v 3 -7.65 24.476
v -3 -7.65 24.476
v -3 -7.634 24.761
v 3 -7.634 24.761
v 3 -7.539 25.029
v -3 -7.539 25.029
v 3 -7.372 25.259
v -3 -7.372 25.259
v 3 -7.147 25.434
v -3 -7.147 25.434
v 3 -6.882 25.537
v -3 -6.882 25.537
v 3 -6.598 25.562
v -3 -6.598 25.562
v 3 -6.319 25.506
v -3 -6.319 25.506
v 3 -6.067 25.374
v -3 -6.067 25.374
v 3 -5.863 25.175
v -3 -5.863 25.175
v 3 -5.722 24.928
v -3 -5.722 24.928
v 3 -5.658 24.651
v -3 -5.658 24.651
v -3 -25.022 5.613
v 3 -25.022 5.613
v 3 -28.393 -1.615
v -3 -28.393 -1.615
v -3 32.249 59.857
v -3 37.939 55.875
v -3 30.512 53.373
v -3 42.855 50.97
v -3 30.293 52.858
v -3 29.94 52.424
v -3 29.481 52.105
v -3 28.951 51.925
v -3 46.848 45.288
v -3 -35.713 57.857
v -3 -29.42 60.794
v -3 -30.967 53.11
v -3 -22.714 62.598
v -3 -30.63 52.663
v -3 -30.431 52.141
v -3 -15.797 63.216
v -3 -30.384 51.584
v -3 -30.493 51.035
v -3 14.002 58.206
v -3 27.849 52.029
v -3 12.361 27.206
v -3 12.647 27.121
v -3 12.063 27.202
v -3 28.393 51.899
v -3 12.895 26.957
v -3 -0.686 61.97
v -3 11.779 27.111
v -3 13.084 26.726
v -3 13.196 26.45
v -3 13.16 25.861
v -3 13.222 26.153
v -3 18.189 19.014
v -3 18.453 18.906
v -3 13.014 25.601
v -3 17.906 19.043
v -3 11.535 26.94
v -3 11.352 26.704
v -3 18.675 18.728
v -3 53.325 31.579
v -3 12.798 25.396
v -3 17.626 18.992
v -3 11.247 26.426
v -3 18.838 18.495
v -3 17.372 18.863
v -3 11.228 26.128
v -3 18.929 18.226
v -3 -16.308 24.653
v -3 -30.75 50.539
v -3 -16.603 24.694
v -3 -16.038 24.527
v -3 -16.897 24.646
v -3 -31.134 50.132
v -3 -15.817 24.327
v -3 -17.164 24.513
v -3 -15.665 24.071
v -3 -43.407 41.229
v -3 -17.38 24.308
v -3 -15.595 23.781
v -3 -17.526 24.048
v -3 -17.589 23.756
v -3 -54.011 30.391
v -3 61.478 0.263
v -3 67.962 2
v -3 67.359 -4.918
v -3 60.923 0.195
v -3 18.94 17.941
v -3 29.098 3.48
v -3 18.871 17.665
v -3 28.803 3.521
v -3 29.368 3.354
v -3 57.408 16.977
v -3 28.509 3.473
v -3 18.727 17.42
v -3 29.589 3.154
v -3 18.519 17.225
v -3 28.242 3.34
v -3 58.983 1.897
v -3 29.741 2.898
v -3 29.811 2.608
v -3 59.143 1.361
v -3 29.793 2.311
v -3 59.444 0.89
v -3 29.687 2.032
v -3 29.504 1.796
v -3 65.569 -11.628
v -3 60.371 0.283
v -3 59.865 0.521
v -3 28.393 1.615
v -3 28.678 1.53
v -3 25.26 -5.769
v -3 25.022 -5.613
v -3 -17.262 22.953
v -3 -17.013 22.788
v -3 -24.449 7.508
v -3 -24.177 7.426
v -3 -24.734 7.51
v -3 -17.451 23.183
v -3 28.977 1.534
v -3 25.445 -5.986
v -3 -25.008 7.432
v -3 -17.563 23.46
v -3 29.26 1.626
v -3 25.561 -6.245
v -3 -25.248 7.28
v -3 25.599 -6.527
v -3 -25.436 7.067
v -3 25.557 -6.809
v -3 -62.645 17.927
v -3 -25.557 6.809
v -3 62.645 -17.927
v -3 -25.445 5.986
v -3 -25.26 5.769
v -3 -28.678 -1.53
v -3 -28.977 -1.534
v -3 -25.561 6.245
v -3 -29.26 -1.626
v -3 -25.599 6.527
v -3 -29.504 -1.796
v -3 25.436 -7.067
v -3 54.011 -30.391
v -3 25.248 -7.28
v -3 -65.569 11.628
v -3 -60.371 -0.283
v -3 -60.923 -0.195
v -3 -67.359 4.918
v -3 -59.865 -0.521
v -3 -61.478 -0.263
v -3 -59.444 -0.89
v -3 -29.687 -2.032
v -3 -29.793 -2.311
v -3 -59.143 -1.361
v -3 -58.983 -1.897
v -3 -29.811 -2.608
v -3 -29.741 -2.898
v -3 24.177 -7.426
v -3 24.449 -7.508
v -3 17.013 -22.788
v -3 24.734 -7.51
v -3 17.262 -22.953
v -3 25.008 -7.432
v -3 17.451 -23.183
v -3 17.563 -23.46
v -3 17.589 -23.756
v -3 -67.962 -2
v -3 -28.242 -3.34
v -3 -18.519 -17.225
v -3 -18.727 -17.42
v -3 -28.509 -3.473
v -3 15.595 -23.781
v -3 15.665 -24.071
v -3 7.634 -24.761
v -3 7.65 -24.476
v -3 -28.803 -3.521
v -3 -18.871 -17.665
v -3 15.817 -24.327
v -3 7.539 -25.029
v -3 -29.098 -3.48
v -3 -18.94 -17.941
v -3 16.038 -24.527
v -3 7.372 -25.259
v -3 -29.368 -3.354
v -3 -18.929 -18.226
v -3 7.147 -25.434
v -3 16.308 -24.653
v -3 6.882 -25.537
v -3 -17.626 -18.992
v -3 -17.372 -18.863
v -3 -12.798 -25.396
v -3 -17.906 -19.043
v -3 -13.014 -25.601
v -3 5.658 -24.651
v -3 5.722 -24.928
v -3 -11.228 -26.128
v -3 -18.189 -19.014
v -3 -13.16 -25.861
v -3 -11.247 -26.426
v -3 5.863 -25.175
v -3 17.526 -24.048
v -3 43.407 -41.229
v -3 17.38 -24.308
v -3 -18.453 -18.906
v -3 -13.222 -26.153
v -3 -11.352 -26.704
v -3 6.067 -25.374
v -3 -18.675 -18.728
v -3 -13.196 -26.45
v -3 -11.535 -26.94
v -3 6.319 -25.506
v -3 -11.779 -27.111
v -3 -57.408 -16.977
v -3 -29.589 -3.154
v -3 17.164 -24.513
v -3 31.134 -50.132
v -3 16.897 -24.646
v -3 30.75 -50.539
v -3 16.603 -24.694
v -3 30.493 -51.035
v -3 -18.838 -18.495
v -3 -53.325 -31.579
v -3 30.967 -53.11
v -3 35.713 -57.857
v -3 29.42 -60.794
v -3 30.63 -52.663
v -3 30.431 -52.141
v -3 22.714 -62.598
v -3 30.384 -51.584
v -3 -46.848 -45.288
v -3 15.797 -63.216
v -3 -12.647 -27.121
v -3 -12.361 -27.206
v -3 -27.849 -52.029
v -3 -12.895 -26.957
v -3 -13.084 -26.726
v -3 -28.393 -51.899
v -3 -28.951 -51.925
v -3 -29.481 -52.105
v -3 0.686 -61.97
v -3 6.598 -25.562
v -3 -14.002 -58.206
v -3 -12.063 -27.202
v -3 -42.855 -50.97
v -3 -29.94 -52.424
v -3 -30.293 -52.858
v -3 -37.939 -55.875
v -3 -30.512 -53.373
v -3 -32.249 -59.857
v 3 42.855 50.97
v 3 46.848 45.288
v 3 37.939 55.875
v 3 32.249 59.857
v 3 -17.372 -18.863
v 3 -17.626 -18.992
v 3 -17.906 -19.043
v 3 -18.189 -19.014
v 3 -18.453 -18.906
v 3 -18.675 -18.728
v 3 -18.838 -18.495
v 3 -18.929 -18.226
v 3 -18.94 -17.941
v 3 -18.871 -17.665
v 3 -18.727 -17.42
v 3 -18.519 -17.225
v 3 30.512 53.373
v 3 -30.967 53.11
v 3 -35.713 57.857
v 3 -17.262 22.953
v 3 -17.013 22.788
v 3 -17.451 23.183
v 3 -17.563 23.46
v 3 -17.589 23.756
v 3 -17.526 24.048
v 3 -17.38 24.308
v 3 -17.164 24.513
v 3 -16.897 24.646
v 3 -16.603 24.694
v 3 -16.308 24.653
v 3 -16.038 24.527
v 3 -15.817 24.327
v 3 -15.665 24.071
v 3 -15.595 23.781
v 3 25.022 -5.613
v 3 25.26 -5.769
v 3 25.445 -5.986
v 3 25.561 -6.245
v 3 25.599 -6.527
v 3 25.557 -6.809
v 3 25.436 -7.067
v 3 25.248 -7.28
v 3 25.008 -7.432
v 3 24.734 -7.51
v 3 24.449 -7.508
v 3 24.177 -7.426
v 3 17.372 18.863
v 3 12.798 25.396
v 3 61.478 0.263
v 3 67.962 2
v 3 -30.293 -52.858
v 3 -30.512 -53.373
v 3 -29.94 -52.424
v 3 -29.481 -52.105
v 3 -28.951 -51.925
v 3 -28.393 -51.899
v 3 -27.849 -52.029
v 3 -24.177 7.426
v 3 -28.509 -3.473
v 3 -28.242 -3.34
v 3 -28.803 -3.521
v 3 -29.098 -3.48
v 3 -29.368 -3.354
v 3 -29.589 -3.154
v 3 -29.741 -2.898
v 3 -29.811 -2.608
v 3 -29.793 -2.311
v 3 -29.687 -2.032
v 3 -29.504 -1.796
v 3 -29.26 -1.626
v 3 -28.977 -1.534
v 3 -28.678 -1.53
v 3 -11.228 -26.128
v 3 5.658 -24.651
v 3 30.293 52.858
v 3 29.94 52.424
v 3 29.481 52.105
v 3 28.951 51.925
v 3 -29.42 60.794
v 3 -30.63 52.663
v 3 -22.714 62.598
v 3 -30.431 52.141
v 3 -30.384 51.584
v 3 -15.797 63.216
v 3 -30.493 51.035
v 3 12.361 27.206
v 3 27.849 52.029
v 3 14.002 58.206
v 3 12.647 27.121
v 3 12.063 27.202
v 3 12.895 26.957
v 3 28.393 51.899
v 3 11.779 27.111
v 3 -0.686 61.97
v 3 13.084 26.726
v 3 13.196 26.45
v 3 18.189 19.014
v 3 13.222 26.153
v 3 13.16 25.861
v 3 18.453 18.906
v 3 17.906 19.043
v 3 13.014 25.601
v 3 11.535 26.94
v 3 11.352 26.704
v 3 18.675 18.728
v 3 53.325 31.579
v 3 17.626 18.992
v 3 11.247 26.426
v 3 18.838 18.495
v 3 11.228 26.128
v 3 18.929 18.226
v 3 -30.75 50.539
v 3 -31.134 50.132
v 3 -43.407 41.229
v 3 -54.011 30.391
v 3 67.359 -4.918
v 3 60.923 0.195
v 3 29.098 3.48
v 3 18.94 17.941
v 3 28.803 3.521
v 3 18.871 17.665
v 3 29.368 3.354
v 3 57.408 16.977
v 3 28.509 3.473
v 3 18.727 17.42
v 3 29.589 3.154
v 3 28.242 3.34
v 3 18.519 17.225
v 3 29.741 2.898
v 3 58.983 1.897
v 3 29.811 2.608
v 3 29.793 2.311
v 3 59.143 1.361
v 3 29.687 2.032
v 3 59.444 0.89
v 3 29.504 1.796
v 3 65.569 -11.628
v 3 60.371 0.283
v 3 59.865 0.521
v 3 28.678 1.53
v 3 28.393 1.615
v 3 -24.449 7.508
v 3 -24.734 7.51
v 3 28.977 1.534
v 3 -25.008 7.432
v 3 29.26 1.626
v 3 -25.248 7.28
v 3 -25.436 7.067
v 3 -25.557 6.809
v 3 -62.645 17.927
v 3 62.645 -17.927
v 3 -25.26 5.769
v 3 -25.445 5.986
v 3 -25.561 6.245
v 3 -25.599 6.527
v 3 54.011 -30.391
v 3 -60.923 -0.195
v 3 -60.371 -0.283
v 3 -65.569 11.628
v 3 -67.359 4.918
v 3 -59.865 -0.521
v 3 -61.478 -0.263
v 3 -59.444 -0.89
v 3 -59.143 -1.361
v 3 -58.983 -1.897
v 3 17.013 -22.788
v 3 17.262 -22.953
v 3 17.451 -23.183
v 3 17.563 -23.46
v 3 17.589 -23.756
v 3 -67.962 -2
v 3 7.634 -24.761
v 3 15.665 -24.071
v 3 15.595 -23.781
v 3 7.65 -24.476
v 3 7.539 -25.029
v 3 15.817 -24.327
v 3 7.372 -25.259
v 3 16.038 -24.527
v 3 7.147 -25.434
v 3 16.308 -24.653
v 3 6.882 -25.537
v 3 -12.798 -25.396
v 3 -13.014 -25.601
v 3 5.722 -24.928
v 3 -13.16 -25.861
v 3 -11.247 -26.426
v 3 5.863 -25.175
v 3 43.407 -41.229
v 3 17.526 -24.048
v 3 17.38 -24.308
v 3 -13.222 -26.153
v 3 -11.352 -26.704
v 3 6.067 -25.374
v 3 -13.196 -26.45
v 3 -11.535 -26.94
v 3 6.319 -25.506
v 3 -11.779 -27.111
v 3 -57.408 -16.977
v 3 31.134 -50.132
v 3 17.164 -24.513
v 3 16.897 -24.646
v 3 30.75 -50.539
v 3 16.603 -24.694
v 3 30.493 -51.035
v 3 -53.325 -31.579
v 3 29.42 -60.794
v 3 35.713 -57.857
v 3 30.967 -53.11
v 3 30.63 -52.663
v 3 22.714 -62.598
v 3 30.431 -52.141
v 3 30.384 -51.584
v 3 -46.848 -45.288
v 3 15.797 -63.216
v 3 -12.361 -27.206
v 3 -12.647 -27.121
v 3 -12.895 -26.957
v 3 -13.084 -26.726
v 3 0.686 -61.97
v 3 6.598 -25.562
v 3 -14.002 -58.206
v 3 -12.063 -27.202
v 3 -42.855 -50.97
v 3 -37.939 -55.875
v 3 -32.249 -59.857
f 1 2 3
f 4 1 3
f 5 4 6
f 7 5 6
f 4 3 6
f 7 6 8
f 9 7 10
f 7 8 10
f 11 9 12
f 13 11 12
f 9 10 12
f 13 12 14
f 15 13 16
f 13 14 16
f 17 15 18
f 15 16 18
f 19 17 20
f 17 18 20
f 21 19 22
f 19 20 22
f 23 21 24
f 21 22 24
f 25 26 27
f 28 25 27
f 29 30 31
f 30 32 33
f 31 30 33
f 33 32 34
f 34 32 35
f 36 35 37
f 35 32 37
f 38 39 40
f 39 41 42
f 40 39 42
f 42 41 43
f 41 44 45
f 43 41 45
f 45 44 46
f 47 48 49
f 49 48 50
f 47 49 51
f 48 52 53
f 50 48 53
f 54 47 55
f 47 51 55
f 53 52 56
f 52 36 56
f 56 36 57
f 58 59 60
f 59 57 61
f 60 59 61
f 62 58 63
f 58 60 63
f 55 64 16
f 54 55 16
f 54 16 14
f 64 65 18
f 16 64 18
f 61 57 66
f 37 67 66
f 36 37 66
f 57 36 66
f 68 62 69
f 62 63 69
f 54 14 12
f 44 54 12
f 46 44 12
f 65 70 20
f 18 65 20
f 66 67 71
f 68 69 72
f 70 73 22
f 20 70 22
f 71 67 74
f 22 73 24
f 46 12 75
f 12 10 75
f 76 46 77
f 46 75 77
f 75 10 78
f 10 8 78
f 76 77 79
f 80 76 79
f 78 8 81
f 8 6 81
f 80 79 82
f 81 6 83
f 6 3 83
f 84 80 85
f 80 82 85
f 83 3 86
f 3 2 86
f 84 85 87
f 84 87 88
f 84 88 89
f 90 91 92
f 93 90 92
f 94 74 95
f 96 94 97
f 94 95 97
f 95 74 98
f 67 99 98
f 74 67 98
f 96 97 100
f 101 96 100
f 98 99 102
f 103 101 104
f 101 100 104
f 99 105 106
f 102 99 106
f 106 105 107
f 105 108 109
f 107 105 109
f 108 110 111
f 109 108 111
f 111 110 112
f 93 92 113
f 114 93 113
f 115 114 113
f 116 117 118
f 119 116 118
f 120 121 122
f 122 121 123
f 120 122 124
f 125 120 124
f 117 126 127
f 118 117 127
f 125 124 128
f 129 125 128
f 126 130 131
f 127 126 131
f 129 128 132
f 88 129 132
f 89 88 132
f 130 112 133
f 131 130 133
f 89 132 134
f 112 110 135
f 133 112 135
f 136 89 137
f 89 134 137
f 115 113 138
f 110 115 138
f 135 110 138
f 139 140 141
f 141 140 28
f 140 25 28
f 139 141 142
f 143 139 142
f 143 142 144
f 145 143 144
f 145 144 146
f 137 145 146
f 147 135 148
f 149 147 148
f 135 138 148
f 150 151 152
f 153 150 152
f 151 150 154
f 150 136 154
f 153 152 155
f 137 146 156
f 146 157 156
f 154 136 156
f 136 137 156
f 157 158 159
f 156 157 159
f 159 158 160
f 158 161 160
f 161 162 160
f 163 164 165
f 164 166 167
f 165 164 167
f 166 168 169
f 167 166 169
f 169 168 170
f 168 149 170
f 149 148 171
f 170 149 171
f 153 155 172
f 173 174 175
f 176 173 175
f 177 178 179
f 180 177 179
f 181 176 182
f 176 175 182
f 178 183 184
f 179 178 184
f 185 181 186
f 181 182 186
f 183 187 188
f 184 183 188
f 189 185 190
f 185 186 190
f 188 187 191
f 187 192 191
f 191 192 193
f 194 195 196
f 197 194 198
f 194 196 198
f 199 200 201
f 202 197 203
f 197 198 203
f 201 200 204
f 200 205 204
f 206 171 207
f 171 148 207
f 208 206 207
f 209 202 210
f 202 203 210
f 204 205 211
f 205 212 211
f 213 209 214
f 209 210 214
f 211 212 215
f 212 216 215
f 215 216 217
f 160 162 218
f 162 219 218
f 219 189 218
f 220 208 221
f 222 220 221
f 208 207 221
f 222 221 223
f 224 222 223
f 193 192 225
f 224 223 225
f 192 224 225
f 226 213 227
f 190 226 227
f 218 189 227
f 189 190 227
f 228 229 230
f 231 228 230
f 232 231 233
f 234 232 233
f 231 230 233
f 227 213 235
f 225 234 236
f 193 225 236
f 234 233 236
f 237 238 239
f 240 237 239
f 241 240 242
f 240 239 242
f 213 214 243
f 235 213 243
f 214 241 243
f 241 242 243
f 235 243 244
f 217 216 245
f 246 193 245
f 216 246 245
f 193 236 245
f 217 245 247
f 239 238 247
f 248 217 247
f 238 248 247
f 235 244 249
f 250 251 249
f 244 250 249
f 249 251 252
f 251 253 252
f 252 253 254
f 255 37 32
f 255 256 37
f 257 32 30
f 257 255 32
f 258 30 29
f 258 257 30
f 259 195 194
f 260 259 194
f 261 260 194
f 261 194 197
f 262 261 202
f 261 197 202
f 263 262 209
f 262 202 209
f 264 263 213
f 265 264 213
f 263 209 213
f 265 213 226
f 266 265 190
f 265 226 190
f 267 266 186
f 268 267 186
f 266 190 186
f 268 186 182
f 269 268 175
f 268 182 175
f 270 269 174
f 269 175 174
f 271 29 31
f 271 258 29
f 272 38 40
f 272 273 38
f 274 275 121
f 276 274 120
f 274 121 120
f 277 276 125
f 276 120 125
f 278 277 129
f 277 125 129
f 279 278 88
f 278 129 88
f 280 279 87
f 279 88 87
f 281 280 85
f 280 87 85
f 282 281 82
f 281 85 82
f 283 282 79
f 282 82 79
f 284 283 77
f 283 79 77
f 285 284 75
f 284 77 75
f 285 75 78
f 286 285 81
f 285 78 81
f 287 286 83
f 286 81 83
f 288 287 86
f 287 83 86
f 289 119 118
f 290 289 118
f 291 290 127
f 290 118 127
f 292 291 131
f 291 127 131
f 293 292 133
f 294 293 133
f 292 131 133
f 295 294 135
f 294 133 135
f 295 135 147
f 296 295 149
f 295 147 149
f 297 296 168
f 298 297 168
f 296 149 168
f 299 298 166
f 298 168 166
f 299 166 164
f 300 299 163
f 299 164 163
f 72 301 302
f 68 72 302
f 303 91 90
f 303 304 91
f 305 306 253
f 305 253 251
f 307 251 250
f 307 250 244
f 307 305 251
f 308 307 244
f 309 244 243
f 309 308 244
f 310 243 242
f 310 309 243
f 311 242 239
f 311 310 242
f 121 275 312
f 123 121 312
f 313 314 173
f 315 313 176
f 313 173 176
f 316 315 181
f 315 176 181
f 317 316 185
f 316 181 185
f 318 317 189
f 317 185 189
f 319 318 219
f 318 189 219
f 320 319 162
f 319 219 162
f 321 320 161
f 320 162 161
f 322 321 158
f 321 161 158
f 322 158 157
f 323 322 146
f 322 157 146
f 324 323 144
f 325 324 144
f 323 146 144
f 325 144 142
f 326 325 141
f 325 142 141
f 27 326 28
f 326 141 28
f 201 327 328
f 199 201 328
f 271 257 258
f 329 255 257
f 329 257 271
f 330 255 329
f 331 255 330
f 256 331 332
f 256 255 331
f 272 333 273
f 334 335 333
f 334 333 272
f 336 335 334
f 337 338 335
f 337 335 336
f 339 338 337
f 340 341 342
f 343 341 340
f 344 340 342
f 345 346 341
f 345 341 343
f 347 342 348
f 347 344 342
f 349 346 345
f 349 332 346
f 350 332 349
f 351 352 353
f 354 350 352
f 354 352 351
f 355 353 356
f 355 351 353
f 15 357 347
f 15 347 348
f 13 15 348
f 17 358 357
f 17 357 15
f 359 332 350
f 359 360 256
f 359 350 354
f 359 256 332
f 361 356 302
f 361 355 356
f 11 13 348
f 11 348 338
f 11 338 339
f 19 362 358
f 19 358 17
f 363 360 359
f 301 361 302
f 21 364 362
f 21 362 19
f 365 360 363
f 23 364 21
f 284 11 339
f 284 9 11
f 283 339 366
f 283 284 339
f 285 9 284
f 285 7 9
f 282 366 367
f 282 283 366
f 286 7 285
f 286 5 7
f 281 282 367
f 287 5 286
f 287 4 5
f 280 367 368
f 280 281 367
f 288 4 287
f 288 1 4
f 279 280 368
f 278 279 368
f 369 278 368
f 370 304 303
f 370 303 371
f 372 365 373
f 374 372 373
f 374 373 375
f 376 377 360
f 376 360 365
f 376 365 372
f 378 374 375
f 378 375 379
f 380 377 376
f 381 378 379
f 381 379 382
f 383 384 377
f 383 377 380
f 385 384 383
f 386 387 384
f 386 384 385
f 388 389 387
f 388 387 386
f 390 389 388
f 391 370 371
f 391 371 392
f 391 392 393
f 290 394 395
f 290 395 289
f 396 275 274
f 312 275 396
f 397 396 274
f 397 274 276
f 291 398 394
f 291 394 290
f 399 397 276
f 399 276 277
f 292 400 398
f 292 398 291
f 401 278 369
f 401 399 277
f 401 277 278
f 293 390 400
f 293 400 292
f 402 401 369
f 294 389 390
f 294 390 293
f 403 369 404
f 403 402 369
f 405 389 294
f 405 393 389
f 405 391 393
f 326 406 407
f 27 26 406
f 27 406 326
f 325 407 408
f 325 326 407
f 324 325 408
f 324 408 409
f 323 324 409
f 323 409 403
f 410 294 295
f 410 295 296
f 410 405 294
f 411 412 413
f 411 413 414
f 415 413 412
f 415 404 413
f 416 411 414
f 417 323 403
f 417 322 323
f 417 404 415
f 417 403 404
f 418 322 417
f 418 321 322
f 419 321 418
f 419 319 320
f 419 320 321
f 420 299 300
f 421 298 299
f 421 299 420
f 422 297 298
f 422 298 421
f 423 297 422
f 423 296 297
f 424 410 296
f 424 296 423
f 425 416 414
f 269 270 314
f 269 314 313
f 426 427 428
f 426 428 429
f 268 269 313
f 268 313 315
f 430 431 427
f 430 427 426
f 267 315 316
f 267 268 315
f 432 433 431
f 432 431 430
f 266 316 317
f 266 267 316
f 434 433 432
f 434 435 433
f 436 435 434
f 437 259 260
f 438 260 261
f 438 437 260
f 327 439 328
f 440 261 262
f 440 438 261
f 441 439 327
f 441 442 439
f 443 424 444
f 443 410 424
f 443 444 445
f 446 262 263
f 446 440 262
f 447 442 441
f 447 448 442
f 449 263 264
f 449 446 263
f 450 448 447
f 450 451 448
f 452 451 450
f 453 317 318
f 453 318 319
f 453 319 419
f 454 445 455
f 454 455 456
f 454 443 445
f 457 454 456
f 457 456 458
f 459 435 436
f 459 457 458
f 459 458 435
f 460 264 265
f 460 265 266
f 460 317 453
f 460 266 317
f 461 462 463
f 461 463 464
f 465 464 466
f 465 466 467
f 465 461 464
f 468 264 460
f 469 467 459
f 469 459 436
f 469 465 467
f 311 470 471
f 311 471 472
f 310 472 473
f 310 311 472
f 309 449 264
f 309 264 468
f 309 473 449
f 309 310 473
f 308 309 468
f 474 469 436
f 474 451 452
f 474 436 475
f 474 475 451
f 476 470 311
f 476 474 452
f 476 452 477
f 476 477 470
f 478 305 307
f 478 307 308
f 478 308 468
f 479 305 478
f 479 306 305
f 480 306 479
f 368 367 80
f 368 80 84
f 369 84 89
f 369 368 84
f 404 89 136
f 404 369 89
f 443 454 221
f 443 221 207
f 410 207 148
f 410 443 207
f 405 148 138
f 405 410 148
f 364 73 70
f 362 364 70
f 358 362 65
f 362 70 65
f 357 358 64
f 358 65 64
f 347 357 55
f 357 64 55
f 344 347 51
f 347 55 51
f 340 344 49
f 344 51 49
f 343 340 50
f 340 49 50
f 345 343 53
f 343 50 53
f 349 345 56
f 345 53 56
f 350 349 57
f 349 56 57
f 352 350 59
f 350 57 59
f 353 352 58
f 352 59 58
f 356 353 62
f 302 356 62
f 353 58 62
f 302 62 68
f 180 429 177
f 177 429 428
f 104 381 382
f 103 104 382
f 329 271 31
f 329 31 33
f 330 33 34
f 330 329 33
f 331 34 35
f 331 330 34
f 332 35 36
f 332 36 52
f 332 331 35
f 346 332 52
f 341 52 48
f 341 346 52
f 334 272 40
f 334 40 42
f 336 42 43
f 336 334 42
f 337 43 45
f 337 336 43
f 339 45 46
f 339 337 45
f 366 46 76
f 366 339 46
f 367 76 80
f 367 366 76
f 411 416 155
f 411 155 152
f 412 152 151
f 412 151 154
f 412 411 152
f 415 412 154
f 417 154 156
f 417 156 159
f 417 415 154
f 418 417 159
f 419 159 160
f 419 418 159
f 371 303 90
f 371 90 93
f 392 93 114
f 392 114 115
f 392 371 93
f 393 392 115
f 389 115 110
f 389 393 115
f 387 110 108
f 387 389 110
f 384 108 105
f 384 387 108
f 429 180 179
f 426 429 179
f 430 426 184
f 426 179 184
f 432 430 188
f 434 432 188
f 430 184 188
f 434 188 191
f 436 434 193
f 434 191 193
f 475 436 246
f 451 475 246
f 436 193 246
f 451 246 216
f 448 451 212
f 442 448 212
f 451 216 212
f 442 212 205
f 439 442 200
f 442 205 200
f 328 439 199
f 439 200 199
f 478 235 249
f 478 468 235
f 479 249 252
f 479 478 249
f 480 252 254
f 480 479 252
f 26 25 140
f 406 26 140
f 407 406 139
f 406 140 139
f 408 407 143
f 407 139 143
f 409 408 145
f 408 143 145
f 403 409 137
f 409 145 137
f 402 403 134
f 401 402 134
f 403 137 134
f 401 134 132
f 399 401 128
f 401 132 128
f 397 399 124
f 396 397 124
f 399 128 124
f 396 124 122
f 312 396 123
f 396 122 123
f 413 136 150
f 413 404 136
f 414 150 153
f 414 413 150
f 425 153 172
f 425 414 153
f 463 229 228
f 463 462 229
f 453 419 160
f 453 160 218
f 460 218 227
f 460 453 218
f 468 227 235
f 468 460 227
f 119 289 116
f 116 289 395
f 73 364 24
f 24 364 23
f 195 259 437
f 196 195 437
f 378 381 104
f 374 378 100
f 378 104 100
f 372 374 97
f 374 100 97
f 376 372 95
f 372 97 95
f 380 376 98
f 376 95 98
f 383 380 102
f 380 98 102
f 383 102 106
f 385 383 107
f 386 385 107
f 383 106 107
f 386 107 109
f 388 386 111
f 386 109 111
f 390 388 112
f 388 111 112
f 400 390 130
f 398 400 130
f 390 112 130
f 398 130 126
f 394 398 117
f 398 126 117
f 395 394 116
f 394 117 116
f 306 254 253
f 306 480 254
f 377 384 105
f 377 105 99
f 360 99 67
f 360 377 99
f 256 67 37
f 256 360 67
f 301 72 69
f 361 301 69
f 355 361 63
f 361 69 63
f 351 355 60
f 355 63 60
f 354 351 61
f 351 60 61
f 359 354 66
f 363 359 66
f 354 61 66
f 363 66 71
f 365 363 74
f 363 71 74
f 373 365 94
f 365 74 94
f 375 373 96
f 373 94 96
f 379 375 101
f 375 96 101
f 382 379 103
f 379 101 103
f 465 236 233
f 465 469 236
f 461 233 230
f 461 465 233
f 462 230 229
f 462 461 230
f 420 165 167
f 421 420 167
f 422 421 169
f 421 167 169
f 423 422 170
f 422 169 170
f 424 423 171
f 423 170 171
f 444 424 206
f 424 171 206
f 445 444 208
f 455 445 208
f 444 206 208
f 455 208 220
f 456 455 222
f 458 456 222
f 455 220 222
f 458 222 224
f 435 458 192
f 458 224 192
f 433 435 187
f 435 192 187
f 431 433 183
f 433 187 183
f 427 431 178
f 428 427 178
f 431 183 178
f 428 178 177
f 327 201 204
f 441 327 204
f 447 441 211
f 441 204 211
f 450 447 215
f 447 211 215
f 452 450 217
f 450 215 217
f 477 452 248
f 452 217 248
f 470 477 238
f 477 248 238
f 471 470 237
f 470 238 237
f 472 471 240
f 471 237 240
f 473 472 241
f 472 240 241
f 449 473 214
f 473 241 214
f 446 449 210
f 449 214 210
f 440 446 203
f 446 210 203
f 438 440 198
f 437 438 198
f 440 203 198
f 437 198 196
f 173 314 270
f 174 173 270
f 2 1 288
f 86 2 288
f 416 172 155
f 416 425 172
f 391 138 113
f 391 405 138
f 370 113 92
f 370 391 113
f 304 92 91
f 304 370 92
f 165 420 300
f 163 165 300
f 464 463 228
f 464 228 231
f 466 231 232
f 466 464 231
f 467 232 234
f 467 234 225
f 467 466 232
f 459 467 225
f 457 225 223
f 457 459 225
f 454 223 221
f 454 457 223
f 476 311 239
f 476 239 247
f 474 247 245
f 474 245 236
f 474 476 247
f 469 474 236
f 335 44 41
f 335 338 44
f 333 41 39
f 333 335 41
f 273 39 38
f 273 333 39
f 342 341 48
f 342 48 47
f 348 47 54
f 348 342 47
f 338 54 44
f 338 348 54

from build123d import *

# Parameters (mm, degrees)
SKETCH1_R                = 59
EXTRUDE1_DEPTH           = 3
EXTRUDE2_DEPTH           = 3
CIRPATTERN1_COUNT        = 6
F_2_0_2_DIAMETER_HOLE1_D = 2
F_2_0_2_DIAMETER_HOLE3_D = 2
CIRPATTERN2_COUNT        = 6


with BuildPart() as part:
    # Sketch1 → Extrude1 (new, symmetric)
    with BuildSketch(Plane(origin=(0, 0, 0), x_dir=(0, 0, -1), z_dir=(1, 0, 0))):
        Circle(SKETCH1_R)
        Polygon((23.694176429, 16.590840947), (-2.521001516, 28.815179183), (-26.215177945, 12.224338236), (-23.694176429, -16.590840947), (2.521001516, -28.815179183), (26.215177945, -12.224338236), align=None, mode=Mode.SUBTRACT)
    extrude(amount=EXTRUDE1_DEPTH, both=True)

    # Sketch2 → Extrude2 (add, symmetric)
    with BuildSketch(Plane(origin=(0, 0, 0), x_dir=(0, 0, -1), z_dir=(1, 0, 0))):
        with BuildLine():
            Line((-2, 67.961805723), (-0.262709442, 61.478149092))
            ThreePointArc((-0.262709442, 61.478149092), (-0.58620663, 59.77173183), (-2.122608272, 58.961805723))
            ThreePointArc((-2.122608272, 58.961805723), (28.679663449, 51.560419941), (51.21368579, 29.294340542))
            ThreePointArc((51.21368579, 29.294340542), (36.791707484, 48.186627241), (17.927108603, 62.644803614))
            ThreePointArc((17.927108603, 62.644803614), (8.312130826, 66.609702921), (-2, 67.961805723))
        make_face()
    extrude2 = extrude(amount=EXTRUDE2_DEPTH, both=True)

    # CirPattern1: Extrude2 ×6 about axis
    cirpattern1_axis = Axis((0, 0, 0), (1, 0, 0))
    for i in range(1, CIRPATTERN1_COUNT):
        add(extrude2.rotate(cirpattern1_axis, i * 360 / CIRPATTERN1_COUNT))

    # Ø2.0 (2) Diameter Hole1 (through all)
    with Locations(Plane(origin=(3, 0, 0), x_dir=(0, 0, -1), z_dir=(1, 0, 0))):
        with Locations((-2.521001516, 28.815179183), (23.694176429, 16.590840947), (26.215177945, -12.224338236), (2.521001516, -28.815179183), (-23.694176429, -16.590840947), (-26.215177945, 12.224338236)):
            Hole(F_2_0_2_DIAMETER_HOLE1_D / 2)

    # Ø2.0 (2) Diameter Hole3 (through all)
    with Locations(Plane(origin=(3, 0, 0), x_dir=(0, 0, -1), z_dir=(1, 0, 0))):
        with Locations((6.519493728, 24.599527017)):
            f_2_0_2_diameter_hole3 = Hole(F_2_0_2_DIAMETER_HOLE3_D / 2)

    # CirPattern2: Ø2.0 (2) Diameter Hole3 ×6 about axis
    cirpattern2_axis = Axis((0, 0, 0), (1, 0, 0))
    for i in range(1, CIRPATTERN2_COUNT):
        add(f_2_0_2_diameter_hole3.rotate(cirpattern2_axis, i * 360 / CIRPATTERN2_COUNT), mode=Mode.SUBTRACT)


solid = part.part
